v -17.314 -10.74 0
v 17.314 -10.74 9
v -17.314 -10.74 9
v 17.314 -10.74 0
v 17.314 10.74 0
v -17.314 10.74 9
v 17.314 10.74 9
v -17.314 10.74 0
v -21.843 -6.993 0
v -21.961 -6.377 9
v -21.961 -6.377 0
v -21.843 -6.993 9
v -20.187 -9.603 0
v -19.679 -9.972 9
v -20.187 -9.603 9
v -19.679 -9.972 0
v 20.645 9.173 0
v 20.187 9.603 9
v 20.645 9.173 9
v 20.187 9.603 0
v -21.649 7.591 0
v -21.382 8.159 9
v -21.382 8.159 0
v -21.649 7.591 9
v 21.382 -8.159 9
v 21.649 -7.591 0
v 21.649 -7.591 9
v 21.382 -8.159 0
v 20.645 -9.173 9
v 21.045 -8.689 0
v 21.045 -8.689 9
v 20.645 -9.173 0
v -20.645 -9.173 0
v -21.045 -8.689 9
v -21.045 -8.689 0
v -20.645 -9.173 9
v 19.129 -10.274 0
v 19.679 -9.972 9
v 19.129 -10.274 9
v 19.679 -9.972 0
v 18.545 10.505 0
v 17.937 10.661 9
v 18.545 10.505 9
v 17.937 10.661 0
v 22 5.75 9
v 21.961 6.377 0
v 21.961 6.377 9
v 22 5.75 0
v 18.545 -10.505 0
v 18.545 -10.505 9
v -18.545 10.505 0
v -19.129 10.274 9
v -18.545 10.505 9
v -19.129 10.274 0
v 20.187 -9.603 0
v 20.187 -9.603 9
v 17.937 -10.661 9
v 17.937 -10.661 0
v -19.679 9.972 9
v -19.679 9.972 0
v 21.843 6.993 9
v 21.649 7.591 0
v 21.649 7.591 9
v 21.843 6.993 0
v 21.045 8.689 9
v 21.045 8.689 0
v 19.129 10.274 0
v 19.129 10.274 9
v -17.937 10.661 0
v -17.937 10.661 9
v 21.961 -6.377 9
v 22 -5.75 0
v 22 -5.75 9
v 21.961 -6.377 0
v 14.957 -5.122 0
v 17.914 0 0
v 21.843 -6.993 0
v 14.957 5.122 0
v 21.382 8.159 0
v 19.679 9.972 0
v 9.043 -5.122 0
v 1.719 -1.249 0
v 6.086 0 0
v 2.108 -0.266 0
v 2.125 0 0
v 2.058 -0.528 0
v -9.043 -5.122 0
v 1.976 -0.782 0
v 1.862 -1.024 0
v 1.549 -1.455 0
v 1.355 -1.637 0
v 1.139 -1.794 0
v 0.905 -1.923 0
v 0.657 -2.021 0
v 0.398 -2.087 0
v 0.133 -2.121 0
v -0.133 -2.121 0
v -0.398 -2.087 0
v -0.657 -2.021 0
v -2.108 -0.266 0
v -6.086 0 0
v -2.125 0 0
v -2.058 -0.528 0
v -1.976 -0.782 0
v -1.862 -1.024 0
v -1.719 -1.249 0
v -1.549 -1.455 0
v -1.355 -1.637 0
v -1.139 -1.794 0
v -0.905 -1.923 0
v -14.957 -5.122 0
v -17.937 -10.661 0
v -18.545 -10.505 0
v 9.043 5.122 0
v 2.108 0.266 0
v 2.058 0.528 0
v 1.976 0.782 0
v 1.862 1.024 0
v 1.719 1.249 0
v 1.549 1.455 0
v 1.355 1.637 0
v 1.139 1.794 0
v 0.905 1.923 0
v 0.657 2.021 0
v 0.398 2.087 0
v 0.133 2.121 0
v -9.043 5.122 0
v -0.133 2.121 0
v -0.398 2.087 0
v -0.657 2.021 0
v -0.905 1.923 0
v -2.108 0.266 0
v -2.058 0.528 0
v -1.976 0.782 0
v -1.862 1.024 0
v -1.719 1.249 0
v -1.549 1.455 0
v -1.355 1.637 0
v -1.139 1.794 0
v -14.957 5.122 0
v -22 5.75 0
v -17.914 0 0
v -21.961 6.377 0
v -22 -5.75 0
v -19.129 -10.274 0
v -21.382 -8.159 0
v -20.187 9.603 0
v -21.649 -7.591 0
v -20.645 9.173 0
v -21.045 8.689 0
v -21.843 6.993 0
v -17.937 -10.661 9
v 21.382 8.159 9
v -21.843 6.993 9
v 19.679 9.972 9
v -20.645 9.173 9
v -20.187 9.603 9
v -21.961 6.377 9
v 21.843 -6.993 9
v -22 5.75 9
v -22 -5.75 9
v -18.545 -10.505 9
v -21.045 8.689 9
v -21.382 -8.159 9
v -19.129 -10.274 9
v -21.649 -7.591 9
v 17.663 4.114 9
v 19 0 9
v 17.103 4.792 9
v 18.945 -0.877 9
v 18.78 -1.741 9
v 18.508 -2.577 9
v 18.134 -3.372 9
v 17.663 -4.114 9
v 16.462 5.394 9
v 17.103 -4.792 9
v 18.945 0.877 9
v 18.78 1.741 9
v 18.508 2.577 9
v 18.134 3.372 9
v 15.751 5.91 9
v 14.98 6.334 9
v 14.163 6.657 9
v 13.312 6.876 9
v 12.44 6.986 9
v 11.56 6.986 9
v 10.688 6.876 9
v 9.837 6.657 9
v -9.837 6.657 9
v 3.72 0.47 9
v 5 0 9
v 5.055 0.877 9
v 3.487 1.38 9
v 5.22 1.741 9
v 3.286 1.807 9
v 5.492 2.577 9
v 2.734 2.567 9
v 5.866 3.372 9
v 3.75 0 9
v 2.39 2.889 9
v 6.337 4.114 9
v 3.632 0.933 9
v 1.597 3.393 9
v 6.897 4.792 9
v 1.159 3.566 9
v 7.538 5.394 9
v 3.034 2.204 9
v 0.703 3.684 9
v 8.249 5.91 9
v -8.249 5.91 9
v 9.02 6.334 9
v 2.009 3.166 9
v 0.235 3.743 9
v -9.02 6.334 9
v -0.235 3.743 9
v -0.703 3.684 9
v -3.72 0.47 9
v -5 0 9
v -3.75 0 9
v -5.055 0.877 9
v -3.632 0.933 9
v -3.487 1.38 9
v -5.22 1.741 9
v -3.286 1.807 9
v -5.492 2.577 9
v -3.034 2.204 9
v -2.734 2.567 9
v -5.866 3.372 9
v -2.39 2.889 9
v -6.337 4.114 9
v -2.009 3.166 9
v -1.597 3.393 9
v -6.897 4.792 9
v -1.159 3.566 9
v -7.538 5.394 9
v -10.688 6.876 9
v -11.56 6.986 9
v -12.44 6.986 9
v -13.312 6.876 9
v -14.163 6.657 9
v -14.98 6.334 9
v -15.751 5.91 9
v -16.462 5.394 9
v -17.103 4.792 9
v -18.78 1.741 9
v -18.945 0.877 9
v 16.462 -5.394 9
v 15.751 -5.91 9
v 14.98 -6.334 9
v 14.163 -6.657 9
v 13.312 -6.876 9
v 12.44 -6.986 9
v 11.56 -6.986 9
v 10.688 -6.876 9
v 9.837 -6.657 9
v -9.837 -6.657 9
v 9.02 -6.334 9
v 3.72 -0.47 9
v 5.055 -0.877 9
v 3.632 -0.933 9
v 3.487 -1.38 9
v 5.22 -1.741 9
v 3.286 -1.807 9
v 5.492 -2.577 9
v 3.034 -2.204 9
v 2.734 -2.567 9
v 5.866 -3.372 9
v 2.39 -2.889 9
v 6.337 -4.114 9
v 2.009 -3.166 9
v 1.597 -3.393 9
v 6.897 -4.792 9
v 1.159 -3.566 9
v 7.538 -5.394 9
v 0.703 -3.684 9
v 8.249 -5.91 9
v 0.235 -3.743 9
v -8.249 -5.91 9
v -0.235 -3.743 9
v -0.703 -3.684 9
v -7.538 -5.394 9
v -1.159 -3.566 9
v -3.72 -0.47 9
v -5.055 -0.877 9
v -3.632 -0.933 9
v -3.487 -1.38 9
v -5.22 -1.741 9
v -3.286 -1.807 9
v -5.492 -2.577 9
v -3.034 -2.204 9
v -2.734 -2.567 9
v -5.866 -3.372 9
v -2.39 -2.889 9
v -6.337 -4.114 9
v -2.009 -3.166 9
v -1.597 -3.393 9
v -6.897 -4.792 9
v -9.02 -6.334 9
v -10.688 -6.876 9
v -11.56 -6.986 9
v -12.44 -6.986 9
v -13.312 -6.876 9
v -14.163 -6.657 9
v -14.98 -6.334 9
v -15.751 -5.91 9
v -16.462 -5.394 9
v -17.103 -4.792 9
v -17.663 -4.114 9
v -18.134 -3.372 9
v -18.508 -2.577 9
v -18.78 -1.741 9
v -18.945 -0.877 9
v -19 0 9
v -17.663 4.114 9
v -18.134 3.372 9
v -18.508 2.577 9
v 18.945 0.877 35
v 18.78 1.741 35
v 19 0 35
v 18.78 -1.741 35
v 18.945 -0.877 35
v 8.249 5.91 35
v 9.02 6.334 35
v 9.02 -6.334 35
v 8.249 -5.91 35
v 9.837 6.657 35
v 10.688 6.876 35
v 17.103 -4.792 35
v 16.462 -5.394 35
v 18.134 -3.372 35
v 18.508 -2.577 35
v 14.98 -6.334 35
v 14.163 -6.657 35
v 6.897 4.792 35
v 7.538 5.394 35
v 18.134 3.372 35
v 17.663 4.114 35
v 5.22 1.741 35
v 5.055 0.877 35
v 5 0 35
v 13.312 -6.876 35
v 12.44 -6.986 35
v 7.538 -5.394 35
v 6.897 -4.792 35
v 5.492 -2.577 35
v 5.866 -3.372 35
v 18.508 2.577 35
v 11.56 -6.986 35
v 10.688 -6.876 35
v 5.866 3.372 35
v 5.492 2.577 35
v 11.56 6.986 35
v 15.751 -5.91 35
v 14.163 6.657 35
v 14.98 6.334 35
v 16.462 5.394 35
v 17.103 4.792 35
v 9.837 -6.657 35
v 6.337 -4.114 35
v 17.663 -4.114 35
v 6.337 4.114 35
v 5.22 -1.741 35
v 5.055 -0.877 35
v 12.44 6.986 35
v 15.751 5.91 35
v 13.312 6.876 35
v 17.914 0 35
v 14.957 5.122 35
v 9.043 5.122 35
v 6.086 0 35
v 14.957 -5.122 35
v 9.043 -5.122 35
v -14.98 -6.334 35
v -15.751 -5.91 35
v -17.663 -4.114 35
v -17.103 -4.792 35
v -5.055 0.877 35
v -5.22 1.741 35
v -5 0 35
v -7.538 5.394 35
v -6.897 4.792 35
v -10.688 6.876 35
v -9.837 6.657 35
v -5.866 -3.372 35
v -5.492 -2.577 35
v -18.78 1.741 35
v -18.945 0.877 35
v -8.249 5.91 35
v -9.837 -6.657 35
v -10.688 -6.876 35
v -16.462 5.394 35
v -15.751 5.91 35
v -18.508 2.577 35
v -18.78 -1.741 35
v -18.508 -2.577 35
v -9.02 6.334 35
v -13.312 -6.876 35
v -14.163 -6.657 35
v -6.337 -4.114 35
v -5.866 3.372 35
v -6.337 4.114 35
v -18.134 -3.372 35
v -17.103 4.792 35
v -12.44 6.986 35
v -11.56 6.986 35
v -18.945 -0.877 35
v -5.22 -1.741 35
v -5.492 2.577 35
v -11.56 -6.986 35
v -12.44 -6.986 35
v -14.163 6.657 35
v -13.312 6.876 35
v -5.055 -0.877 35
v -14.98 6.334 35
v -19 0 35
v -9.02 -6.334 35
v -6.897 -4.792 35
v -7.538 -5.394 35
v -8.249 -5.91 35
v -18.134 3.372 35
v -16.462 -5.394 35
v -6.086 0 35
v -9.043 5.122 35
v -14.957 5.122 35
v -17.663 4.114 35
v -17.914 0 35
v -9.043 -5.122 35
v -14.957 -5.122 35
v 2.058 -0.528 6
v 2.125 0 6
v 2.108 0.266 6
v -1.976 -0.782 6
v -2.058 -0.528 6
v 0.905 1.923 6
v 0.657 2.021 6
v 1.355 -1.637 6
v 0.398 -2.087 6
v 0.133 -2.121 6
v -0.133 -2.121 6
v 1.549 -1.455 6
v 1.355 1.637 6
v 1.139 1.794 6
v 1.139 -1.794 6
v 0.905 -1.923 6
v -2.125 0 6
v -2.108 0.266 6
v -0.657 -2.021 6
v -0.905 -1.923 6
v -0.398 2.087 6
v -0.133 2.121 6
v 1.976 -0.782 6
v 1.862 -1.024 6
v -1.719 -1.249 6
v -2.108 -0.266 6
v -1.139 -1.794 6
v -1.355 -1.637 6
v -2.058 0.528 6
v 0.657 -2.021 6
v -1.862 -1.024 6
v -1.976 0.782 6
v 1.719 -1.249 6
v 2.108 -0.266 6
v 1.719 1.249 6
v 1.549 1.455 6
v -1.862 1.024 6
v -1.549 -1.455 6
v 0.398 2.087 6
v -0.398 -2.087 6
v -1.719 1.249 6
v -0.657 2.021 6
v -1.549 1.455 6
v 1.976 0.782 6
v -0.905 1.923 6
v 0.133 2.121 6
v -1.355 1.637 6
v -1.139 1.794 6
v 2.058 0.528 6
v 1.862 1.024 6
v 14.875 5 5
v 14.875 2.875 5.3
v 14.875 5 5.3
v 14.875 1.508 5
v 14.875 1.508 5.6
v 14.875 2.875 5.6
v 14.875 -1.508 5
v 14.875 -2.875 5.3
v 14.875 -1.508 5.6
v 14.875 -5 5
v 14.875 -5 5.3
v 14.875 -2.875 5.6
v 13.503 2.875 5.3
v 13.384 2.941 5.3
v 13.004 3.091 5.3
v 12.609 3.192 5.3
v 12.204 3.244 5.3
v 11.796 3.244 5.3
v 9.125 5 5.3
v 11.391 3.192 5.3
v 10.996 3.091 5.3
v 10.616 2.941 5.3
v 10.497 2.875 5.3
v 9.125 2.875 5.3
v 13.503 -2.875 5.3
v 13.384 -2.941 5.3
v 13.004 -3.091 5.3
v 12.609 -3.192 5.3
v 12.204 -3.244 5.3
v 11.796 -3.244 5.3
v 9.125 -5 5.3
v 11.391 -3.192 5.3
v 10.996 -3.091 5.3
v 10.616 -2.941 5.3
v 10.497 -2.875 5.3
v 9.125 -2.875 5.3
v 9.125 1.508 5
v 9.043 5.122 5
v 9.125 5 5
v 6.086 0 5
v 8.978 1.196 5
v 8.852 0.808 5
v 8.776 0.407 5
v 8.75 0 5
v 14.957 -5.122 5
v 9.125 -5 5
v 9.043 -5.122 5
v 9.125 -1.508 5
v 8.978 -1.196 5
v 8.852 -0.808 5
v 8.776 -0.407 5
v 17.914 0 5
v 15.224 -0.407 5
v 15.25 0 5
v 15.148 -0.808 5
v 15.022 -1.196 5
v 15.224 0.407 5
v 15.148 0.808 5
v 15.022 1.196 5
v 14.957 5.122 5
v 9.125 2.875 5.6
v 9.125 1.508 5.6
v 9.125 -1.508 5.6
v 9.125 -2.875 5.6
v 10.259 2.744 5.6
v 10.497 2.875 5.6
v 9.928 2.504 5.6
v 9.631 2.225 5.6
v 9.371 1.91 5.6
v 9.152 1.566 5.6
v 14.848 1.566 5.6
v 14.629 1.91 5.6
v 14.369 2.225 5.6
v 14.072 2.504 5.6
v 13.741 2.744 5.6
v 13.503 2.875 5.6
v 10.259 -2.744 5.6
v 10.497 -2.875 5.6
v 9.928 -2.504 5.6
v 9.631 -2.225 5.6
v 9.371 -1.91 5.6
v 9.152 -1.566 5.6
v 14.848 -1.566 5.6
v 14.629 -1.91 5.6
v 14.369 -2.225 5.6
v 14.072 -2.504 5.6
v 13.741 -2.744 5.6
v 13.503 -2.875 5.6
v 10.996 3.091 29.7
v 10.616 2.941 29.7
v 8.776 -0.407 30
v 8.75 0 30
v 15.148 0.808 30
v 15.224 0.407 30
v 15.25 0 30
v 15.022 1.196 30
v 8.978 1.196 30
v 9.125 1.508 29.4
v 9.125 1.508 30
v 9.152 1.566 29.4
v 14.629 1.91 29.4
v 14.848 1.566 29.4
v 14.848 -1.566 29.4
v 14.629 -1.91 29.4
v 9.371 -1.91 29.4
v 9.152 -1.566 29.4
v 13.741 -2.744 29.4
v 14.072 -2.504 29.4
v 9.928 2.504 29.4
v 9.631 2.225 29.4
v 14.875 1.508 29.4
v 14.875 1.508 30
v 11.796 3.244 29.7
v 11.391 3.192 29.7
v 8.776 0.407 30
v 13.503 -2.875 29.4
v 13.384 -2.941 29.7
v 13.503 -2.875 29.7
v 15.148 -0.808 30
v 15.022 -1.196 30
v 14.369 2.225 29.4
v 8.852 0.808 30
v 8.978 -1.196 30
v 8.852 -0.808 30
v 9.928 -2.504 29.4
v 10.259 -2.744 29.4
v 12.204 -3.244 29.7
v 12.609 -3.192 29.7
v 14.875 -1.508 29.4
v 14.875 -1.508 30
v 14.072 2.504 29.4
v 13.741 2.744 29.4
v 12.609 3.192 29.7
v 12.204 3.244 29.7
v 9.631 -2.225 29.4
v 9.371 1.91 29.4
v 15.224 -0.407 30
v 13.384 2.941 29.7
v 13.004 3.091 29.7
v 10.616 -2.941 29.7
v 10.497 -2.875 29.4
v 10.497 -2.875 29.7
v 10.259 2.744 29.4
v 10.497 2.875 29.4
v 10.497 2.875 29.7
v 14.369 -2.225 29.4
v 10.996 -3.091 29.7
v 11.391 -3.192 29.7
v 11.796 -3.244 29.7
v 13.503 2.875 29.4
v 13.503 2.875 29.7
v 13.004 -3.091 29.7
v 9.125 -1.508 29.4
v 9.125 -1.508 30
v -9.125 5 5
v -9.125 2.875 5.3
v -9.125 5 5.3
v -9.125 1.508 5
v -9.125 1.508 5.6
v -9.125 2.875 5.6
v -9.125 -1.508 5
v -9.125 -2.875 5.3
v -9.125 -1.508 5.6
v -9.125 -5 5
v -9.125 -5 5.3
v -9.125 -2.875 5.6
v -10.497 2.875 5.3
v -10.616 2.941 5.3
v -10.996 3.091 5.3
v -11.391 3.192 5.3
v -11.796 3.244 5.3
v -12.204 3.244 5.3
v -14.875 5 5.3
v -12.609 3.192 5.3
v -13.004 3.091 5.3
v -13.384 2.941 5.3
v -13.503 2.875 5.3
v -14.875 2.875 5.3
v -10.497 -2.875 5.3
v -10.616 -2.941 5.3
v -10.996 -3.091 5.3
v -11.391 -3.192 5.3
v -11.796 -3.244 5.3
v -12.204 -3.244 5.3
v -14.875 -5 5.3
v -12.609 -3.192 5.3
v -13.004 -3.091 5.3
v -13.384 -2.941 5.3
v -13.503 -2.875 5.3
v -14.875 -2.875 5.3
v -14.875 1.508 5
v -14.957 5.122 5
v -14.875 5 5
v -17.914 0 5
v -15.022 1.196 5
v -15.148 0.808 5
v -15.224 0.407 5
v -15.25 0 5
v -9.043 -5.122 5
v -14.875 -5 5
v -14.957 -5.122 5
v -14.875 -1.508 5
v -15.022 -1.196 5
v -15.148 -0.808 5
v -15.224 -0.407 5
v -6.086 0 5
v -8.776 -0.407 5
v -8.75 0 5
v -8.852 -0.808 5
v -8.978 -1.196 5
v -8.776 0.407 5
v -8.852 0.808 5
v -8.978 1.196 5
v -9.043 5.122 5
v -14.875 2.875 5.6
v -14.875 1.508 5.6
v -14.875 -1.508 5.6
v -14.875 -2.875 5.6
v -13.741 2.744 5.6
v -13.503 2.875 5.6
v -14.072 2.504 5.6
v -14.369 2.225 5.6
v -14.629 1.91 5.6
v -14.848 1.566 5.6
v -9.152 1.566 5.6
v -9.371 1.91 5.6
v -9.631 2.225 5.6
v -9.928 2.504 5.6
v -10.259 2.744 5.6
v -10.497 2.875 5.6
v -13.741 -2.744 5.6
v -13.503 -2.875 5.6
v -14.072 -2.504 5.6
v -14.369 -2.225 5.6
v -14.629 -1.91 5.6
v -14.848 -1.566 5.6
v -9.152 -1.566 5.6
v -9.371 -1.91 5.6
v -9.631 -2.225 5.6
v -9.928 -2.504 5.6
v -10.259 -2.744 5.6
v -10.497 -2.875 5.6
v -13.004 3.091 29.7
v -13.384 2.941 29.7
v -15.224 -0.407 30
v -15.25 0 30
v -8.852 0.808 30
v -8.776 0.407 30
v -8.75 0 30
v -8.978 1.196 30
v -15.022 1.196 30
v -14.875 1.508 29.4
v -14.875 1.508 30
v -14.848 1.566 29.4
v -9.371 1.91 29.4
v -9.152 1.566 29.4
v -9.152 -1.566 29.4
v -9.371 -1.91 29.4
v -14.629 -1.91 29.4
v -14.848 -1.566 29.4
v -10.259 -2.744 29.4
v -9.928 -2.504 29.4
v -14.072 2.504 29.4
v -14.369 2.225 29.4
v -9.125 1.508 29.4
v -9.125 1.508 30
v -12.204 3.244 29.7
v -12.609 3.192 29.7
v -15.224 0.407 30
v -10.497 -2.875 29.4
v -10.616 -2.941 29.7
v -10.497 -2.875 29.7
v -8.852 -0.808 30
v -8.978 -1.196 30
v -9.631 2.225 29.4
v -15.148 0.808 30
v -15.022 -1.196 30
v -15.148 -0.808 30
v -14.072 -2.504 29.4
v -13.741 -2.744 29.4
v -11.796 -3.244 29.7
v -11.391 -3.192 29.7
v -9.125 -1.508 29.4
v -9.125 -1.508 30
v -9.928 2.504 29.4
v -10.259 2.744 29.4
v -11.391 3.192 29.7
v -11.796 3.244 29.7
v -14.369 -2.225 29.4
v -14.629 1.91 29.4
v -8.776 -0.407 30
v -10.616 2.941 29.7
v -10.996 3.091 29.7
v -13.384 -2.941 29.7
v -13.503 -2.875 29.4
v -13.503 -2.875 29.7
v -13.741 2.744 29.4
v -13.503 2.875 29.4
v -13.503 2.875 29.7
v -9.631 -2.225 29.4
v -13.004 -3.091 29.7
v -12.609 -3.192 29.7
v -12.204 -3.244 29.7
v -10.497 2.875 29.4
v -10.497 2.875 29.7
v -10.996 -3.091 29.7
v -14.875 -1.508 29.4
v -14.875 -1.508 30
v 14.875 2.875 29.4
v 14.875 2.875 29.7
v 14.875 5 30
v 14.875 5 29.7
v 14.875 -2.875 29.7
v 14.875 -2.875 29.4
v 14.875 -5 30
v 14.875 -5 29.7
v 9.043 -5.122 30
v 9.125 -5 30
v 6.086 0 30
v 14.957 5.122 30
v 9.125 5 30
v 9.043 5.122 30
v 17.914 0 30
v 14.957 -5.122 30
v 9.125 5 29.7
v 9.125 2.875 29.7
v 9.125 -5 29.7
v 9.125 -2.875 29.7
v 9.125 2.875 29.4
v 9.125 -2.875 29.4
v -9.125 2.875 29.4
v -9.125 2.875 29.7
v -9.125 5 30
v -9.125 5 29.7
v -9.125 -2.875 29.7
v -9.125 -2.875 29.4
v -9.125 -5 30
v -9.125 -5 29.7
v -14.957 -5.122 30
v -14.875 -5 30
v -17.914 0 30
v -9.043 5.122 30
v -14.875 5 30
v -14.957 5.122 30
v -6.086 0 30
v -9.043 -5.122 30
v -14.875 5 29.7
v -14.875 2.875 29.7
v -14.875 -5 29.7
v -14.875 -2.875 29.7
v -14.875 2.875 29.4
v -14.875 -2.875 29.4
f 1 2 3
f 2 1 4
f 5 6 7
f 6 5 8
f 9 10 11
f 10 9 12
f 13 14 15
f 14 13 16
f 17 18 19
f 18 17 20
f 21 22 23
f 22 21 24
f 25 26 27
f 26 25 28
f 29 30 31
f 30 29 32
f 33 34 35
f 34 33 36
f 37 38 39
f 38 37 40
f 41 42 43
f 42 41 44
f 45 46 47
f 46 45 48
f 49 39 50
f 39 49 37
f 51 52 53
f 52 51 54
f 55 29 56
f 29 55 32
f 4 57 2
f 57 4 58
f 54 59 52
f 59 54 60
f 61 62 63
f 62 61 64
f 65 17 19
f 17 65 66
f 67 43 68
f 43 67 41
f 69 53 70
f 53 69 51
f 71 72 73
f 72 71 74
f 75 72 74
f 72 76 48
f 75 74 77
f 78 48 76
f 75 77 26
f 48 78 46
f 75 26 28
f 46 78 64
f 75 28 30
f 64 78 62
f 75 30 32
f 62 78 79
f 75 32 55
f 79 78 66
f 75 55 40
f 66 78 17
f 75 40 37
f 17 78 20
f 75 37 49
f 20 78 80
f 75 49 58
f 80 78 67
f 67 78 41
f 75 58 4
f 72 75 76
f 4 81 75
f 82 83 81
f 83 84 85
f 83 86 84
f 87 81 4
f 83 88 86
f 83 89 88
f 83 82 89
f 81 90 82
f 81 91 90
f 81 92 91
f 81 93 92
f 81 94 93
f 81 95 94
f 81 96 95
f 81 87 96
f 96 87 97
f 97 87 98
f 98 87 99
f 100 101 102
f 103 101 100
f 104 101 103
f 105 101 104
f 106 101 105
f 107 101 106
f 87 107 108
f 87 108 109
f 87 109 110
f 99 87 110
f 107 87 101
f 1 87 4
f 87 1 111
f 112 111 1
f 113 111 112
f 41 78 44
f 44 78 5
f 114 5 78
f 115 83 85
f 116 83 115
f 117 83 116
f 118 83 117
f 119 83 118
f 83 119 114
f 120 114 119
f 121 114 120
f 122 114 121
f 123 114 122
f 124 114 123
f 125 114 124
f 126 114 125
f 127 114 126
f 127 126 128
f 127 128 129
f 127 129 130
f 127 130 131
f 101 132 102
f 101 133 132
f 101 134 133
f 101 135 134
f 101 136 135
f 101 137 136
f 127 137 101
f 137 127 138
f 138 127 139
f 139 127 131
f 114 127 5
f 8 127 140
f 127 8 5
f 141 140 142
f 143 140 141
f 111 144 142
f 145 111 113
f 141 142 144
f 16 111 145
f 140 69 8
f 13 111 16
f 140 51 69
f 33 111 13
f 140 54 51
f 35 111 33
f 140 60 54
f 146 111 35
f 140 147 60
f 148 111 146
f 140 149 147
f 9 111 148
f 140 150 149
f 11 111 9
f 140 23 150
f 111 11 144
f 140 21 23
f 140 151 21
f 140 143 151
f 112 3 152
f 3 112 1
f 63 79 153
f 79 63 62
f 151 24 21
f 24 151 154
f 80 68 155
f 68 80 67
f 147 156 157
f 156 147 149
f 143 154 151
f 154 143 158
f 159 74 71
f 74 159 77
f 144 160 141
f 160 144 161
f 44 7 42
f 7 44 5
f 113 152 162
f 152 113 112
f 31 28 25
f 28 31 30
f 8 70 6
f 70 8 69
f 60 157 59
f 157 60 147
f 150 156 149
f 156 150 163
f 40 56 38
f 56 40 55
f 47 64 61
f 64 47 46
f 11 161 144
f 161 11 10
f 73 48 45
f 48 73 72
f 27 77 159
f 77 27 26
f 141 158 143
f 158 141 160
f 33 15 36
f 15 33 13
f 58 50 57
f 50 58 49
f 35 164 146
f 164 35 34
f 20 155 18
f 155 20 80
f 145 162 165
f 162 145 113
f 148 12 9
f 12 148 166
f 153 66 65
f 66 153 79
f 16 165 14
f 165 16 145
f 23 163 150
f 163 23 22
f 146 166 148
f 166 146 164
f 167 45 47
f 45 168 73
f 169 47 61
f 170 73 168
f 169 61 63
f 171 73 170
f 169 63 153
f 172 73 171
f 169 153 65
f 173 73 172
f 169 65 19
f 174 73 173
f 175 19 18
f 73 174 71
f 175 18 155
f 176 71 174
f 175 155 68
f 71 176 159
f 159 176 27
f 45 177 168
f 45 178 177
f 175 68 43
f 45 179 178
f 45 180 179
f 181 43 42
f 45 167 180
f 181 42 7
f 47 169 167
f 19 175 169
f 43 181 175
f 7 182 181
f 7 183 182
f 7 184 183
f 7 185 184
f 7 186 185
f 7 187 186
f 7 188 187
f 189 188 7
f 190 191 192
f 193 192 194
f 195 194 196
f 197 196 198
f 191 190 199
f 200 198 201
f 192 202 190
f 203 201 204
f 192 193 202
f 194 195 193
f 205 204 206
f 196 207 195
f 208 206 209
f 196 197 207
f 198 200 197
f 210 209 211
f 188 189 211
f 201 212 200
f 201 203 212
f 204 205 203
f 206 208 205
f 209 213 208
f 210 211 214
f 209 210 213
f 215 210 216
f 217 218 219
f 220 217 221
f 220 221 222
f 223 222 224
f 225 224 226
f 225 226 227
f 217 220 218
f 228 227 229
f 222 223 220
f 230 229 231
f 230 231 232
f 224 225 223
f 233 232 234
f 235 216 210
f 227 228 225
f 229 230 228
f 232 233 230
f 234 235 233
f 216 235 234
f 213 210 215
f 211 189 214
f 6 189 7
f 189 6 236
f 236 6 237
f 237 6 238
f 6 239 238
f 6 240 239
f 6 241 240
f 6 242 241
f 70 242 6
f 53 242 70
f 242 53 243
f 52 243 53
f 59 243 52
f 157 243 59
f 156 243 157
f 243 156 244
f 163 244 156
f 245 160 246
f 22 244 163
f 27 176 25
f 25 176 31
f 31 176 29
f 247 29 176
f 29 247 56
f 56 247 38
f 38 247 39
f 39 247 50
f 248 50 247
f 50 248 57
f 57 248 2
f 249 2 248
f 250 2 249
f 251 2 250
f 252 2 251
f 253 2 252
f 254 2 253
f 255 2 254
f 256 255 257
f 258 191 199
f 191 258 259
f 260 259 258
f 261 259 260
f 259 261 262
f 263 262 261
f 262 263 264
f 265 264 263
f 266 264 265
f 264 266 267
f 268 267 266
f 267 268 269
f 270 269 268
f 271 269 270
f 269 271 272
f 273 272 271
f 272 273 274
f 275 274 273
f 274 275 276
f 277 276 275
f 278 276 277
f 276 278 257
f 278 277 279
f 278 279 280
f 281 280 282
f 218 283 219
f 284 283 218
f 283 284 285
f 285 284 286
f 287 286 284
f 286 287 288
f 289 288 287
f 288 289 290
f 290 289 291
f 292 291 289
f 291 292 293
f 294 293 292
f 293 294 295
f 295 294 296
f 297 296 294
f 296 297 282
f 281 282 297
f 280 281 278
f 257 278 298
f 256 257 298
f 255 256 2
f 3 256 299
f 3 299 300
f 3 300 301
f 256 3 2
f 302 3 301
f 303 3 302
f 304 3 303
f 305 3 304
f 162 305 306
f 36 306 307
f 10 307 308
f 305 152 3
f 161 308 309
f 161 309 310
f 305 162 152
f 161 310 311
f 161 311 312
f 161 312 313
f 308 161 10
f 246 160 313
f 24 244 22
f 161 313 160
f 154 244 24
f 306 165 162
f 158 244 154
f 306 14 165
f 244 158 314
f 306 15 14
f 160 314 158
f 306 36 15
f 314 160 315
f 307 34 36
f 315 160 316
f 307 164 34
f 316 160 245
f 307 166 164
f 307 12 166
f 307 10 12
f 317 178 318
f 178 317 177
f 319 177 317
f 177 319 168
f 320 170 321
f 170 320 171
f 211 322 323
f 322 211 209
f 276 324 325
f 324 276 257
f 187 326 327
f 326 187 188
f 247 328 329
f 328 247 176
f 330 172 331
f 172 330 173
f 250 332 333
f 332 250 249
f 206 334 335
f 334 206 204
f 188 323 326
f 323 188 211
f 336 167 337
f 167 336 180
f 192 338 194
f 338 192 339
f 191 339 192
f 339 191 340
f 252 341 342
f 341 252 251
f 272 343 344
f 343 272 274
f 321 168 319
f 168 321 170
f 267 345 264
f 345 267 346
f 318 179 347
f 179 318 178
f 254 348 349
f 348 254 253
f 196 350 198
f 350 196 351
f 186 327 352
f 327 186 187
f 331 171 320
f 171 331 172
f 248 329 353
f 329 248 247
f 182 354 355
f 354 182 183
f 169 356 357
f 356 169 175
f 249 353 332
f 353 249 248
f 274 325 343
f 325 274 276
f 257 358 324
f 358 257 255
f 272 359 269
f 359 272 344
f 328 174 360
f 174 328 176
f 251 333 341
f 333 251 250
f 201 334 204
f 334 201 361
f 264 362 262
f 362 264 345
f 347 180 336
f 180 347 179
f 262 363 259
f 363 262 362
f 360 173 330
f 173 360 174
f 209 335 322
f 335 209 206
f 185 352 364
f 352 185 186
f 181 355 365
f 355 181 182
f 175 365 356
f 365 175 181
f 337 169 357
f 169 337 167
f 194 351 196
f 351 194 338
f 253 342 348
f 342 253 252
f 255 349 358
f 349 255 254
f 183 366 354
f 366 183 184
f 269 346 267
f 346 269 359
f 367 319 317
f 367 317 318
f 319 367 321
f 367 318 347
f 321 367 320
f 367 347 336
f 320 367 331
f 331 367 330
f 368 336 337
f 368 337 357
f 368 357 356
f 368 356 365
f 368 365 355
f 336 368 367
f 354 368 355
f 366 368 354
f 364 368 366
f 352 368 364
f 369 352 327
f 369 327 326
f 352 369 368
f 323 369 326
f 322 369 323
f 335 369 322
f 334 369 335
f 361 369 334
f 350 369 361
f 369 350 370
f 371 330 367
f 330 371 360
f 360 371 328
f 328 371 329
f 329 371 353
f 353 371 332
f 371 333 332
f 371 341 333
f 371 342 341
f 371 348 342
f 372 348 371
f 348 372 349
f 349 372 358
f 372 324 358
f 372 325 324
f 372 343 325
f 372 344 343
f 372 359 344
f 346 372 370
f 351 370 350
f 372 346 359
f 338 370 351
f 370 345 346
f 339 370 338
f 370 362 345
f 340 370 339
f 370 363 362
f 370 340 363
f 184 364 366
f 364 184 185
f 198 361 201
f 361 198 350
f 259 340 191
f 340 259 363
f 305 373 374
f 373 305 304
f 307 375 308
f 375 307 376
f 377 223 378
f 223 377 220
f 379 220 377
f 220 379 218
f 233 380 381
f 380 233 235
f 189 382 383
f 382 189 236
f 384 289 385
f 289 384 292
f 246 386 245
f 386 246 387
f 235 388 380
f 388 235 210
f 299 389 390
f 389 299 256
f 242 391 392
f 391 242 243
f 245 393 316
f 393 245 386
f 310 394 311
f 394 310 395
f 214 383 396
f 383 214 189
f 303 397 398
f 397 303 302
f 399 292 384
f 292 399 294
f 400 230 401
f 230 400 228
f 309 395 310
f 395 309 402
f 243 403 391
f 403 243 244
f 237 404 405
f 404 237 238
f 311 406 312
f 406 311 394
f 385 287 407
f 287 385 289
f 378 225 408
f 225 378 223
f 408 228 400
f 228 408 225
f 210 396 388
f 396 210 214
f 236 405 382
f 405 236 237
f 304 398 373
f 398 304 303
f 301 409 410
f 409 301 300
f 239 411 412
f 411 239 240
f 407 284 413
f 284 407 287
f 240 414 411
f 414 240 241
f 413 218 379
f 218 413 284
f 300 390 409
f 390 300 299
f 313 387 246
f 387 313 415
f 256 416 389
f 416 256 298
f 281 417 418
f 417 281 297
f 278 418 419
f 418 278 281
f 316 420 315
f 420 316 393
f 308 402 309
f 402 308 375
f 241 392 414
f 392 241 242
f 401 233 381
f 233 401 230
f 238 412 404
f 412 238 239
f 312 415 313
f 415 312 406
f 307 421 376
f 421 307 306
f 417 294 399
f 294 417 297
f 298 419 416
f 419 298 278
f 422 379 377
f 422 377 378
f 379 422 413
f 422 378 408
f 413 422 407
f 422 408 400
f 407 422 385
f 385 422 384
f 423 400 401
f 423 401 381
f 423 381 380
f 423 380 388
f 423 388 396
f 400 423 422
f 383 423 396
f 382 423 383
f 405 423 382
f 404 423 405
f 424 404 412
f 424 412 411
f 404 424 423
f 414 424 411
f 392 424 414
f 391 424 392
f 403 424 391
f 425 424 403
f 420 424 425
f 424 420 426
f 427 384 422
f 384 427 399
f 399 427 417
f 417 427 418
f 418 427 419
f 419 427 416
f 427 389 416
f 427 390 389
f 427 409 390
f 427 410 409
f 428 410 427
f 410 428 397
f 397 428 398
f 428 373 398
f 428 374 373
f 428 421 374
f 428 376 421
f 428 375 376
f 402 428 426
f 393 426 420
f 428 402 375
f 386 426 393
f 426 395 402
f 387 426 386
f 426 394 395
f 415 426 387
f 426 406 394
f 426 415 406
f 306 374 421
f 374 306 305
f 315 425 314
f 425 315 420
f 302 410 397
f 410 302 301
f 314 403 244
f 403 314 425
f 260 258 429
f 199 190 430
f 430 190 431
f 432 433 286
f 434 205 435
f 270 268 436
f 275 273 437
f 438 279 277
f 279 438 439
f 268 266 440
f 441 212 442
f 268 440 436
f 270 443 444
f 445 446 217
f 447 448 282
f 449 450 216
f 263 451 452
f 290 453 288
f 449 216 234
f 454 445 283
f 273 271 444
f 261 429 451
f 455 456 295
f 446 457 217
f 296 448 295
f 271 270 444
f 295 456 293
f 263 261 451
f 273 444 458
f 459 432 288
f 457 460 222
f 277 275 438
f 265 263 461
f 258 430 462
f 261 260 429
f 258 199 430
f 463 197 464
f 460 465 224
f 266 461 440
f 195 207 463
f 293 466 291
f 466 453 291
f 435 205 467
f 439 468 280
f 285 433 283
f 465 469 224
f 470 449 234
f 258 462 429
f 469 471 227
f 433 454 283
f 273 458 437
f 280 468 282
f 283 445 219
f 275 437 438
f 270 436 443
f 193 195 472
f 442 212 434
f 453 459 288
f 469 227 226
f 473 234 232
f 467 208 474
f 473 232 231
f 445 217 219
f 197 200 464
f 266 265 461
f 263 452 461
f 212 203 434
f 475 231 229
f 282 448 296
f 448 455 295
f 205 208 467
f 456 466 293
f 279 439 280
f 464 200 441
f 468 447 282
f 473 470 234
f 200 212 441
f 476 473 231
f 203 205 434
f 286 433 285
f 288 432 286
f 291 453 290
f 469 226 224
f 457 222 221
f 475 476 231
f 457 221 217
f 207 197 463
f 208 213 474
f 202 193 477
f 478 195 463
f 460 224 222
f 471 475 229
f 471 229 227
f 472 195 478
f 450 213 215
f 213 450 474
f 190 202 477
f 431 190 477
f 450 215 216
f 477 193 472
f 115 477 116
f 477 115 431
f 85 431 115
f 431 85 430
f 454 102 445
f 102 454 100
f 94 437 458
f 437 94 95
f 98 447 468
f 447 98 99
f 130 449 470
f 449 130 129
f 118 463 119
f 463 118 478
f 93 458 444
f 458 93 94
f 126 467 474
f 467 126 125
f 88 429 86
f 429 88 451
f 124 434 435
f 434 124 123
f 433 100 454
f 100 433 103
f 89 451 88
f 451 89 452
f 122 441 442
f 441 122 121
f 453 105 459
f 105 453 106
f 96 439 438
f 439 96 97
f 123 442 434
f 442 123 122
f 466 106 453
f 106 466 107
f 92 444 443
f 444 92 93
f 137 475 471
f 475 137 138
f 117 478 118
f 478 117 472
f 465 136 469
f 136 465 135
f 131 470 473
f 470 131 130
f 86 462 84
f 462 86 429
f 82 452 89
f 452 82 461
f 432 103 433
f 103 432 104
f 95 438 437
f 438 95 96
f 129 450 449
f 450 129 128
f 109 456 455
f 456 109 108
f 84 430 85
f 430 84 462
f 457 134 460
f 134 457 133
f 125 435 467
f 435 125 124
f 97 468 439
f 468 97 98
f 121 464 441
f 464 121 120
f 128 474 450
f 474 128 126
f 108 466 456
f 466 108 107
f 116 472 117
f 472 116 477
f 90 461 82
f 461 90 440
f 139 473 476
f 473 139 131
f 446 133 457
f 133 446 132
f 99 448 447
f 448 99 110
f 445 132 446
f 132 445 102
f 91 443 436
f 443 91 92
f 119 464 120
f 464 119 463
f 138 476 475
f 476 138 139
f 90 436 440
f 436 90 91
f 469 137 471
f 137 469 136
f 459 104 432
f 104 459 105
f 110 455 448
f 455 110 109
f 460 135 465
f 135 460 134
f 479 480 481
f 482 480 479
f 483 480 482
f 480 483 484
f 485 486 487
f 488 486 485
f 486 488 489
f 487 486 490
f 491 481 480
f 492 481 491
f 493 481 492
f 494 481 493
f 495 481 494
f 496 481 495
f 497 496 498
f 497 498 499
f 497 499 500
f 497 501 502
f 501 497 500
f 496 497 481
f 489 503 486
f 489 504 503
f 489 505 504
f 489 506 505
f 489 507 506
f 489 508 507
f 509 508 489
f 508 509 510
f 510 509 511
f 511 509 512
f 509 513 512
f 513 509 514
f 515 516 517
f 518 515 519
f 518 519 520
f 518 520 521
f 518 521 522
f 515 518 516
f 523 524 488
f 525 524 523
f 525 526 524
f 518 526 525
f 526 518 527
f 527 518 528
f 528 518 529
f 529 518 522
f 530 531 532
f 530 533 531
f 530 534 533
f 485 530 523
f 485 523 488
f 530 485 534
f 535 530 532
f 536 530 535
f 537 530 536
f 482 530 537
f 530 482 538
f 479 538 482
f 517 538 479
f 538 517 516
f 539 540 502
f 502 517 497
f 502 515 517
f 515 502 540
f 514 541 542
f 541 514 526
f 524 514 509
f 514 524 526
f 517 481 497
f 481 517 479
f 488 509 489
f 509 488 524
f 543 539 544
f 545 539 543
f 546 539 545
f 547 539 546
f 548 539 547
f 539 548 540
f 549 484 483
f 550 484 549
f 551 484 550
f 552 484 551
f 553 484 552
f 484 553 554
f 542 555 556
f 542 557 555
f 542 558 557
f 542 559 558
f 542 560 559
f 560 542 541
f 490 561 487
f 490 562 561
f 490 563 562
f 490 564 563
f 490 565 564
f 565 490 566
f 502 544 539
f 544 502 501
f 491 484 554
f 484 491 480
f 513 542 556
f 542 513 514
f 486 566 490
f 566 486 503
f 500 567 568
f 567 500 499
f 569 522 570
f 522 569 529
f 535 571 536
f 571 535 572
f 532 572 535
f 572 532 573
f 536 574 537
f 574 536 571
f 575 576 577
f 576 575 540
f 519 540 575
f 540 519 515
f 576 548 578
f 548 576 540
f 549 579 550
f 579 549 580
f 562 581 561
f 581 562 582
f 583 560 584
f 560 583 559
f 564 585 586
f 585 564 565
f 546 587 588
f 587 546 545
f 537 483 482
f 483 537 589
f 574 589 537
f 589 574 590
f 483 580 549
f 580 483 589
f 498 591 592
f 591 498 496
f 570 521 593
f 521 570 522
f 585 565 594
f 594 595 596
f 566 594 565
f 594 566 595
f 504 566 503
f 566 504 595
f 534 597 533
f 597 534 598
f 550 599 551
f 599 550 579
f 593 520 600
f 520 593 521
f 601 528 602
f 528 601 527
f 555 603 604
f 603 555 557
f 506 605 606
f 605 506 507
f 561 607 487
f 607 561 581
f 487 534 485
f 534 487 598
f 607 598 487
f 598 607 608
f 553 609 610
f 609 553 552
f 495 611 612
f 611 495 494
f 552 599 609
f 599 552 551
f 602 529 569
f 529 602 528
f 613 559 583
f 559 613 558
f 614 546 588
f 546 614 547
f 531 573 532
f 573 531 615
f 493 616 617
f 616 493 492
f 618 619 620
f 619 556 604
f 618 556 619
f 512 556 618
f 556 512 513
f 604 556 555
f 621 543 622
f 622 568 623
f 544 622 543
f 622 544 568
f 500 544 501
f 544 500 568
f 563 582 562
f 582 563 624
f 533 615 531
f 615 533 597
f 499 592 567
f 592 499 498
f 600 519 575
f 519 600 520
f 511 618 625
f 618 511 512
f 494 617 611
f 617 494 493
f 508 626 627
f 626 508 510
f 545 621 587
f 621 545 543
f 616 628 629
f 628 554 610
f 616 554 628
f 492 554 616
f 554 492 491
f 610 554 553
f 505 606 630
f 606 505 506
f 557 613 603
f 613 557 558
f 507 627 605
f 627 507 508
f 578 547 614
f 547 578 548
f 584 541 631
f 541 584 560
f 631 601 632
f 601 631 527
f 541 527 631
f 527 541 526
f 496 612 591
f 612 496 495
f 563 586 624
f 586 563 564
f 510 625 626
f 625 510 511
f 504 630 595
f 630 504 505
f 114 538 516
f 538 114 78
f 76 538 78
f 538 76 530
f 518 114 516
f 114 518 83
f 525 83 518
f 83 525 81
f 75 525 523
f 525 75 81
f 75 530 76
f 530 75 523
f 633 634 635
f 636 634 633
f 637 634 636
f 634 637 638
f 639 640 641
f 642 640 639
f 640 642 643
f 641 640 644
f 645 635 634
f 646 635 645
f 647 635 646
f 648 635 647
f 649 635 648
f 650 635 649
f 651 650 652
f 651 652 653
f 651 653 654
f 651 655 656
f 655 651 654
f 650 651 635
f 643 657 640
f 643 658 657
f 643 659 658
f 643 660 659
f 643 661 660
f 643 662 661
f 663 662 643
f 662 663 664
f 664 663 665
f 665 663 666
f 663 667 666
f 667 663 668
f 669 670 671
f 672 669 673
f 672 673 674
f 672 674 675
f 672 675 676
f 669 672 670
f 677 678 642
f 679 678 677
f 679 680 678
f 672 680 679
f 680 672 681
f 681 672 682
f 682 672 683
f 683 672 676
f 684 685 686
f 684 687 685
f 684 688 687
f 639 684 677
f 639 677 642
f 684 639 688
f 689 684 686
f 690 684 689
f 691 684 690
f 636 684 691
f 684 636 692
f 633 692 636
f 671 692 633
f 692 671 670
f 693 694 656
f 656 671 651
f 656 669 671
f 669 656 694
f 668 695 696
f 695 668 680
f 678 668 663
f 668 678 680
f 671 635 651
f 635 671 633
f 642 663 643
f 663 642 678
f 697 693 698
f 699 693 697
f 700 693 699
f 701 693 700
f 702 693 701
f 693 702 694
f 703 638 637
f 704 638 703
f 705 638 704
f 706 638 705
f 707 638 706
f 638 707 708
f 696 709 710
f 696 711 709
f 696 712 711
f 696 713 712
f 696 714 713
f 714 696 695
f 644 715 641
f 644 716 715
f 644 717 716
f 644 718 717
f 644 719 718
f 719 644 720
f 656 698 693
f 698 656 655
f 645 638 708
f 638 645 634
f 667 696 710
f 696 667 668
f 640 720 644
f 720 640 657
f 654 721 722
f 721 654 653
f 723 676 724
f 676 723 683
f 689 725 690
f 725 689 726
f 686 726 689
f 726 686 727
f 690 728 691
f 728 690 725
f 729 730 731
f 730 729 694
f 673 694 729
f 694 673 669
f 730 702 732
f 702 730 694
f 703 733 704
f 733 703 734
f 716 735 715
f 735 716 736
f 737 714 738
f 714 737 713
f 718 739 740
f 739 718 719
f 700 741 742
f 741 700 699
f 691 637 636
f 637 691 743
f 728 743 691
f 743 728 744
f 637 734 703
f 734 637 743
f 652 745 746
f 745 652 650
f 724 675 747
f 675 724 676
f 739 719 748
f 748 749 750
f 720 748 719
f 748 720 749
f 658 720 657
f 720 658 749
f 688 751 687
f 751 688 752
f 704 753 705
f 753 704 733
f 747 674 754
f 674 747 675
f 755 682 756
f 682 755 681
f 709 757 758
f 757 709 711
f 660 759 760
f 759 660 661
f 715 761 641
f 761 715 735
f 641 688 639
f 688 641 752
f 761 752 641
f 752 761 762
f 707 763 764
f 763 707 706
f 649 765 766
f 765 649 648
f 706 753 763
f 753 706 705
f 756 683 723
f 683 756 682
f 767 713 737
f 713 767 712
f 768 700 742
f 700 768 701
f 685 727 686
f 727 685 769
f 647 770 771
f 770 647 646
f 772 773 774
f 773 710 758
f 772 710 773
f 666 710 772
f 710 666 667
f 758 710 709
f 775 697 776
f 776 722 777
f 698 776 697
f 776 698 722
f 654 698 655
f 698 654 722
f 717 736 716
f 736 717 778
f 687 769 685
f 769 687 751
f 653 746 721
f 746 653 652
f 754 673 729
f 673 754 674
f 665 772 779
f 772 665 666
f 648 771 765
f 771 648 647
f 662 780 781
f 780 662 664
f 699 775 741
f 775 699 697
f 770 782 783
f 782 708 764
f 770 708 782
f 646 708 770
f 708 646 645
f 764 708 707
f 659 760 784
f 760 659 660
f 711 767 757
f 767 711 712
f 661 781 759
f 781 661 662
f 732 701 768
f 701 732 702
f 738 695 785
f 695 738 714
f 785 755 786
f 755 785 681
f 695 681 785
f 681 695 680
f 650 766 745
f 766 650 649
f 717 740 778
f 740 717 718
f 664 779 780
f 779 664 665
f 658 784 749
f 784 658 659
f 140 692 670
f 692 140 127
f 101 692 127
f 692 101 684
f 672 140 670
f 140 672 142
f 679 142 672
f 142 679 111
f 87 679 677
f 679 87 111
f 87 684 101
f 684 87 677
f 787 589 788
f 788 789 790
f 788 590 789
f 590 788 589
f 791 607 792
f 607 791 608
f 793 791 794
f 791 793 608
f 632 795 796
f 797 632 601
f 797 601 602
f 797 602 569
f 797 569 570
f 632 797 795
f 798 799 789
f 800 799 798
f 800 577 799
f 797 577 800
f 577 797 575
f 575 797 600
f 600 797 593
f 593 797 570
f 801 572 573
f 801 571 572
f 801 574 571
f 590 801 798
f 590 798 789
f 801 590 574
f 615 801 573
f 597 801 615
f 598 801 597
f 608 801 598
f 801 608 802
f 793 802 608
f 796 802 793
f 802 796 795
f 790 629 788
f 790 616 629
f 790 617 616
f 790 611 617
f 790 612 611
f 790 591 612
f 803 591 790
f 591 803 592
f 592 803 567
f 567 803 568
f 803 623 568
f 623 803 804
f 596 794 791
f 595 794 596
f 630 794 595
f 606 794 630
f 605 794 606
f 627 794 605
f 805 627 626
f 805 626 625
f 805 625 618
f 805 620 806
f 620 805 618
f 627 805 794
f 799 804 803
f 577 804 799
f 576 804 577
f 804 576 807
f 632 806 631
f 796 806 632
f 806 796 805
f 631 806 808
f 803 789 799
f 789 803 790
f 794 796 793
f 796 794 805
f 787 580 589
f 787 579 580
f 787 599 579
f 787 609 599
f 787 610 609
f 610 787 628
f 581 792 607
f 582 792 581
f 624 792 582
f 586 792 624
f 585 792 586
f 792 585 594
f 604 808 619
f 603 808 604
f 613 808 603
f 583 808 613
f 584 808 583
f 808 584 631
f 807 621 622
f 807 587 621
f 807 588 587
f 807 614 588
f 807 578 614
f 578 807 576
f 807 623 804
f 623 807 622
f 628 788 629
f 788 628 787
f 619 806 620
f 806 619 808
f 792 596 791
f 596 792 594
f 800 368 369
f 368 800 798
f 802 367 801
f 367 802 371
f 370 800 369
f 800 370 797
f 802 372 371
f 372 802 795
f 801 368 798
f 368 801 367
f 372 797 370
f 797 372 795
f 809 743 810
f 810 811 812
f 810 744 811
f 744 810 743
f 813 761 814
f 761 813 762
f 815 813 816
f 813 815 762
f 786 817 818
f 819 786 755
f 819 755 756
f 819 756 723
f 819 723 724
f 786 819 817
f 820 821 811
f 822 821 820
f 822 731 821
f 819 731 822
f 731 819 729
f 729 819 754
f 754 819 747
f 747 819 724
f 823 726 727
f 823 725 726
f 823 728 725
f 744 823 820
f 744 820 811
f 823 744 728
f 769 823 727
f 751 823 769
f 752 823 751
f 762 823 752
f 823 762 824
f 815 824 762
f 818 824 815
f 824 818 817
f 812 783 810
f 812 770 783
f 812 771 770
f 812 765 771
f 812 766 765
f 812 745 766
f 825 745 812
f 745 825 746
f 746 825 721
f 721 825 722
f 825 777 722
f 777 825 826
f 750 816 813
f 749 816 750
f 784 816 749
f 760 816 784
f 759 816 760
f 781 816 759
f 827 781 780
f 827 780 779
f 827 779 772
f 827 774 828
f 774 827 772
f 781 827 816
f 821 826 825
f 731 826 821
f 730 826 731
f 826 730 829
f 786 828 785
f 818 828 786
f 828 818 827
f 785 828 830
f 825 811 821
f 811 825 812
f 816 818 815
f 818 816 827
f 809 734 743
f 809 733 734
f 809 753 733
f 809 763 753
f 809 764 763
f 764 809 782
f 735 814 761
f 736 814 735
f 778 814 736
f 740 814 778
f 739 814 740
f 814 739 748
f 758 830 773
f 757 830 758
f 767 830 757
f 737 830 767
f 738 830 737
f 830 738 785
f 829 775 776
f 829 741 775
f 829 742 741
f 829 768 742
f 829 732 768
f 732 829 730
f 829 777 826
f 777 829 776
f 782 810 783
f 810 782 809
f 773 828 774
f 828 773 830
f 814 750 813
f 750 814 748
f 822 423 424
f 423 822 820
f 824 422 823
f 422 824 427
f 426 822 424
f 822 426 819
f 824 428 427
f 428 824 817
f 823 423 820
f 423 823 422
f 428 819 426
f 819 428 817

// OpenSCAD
$fn = 50;


difference() {
	union() {
		hull() {
			translate(v = [-17.0000000000, 5.7500000000, 0]) {
				cylinder(h = 9, r = 5);
			}
			translate(v = [17.0000000000, 5.7500000000, 0]) {
				cylinder(h = 9, r = 5);
			}
			translate(v = [-17.0000000000, -5.7500000000, 0]) {
				cylinder(h = 9, r = 5);
			}
			translate(v = [17.0000000000, -5.7500000000, 0]) {
				cylinder(h = 9, r = 5);
			}
		}
		translate(v = [12.0000000000, 0, 0.0000000000]) {
			cylinder(h = 35, r = 7.0000000000);
		}
		translate(v = [-12.0000000000, 0, 0.0000000000]) {
			cylinder(h = 35, r = 7.0000000000);
		}
	}
	union() {
		translate(v = [0, 0, 9]) {
			rotate(a = [0, 0, 0]) {
				difference() {
					union() {
						#translate(v = [0, 0, -30.0000000000]) {
							cylinder(h = 30, r = 2.0000000000);
						}
						#translate(v = [0, 0, -3]) {
							cylinder(h = 3, r1 = 2.1250000000, r2 = 3.7500000000);
						}
						#translate(v = [0, 0, -30.0000000000]) {
							cylinder(h = 30, r = 2.1250000000);
						}
						#translate(v = [0, 0, -30.0000000000]) {
							cylinder(h = 30, r = 2.0000000000);
						}
					}
					union();
				}
			}
		}
		translate(v = [12.0000000000, 0, 0]) {
			rotate(a = [0, 0, 0]) {
				difference() {
					union() {
						#translate(v = [-2.8750000000, -5.0000000000, -0.3000000000]) {
							cube(size = [5.7500000000, 10, 0.3000000000]);
						}
						#translate(v = [-2.8750000000, -2.8750000000, -0.6000000000]) {
							cube(size = [5.7500000000, 5.7500000000, 0.3000000000]);
						}
						#translate(v = [-2.8750000000, -5.0000000000, 5]) {
							cube(size = [5.7500000000, 10, 0.3000000000]);
						}
						#translate(v = [-2.8750000000, -2.8750000000, 5.3000000000]) {
							cube(size = [5.7500000000, 5.7500000000, 0.3000000000]);
						}
						#translate(v = [0, 0, -100.0000000000]) {
							cylinder(h = 200, r = 3.2500000000);
						}
						#linear_extrude(height = 5) {
							polygon(points = [[5.9142500000, 0.0000000000], [2.9571250000, 5.1218907443], [-2.9571250000, 5.1218907443], [-5.9142500000, 0.0000000000], [-2.9571250000, -5.1218907443], [2.9571250000, -5.1218907443]]);
						}
						#translate(v = [-2.8750000000, -5.0000000000, -0.3000000000]) {
							cube(size = [5.7500000000, 10, 0.3000000000]);
						}
						#translate(v = [-2.8750000000, -2.8750000000, -0.6000000000]) {
							cube(size = [5.7500000000, 5.7500000000, 0.3000000000]);
						}
						#translate(v = [-2.8750000000, -5.0000000000, 5]) {
							cube(size = [5.7500000000, 10, 0.3000000000]);
						}
						#translate(v = [-2.8750000000, -2.8750000000, 5.3000000000]) {
							cube(size = [5.7500000000, 5.7500000000, 0.3000000000]);
						}
						#translate(v = [0, 0, -100.0000000000]) {
							cylinder(h = 200, r = 3.2500000000);
						}
						#translate(v = [-2.8750000000, -5.0000000000, -0.3000000000]) {
							cube(size = [5.7500000000, 10, 0.3000000000]);
						}
						#translate(v = [-2.8750000000, -2.8750000000, -0.6000000000]) {
							cube(size = [5.7500000000, 5.7500000000, 0.3000000000]);
						}
						#translate(v = [-2.8750000000, -5.0000000000, 5]) {
							cube(size = [5.7500000000, 10, 0.3000000000]);
						}
						#translate(v = [-2.8750000000, -2.8750000000, 5.3000000000]) {
							cube(size = [5.7500000000, 5.7500000000, 0.3000000000]);
						}
						#translate(v = [0, 0, -100.0000000000]) {
							cylinder(h = 200, r = 3.2500000000);
						}
					}
					union();
				}
			}
		}
		translate(v = [-12.0000000000, 0, 0]) {
			rotate(a = [0, 0, 0]) {
				difference() {
					union() {
						#translate(v = [-2.8750000000, -5.0000000000, -0.3000000000]) {
							cube(size = [5.7500000000, 10, 0.3000000000]);
						}
						#translate(v = [-2.8750000000, -2.8750000000, -0.6000000000]) {
							cube(size = [5.7500000000, 5.7500000000, 0.3000000000]);
						}
						#translate(v = [-2.8750000000, -5.0000000000, 5]) {
							cube(size = [5.7500000000, 10, 0.3000000000]);
						}
						#translate(v = [-2.8750000000, -2.8750000000, 5.3000000000]) {
							cube(size = [5.7500000000, 5.7500000000, 0.3000000000]);
						}
						#translate(v = [0, 0, -100.0000000000]) {
							cylinder(h = 200, r = 3.2500000000);
						}
						#linear_extrude(height = 5) {
							polygon(points = [[5.9142500000, 0.0000000000], [2.9571250000, 5.1218907443], [-2.9571250000, 5.1218907443], [-5.9142500000, 0.0000000000], [-2.9571250000, -5.1218907443], [2.9571250000, -5.1218907443]]);
						}
						#translate(v = [-2.8750000000, -5.0000000000, -0.3000000000]) {
							cube(size = [5.7500000000, 10, 0.3000000000]);
						}
						#translate(v = [-2.8750000000, -2.8750000000, -0.6000000000]) {
							cube(size = [5.7500000000, 5.7500000000, 0.3000000000]);
						}
						#translate(v = [-2.8750000000, -5.0000000000, 5]) {
							cube(size = [5.7500000000, 10, 0.3000000000]);
						}
						#translate(v = [-2.8750000000, -2.8750000000, 5.3000000000]) {
							cube(size = [5.7500000000, 5.7500000000, 0.3000000000]);
						}
						#translate(v = [0, 0, -100.0000000000]) {
							cylinder(h = 200, r = 3.2500000000);
						}
						#translate(v = [-2.8750000000, -5.0000000000, -0.3000000000]) {
							cube(size = [5.7500000000, 10, 0.3000000000]);
						}
						#translate(v = [-2.8750000000, -2.8750000000, -0.6000000000]) {
							cube(size = [5.7500000000, 5.7500000000, 0.3000000000]);
						}
						#translate(v = [-2.8750000000, -5.0000000000, 5]) {
							cube(size = [5.7500000000, 10, 0.3000000000]);
						}
						#translate(v = [-2.8750000000, -2.8750000000, 5.3000000000]) {
							cube(size = [5.7500000000, 5.7500000000, 0.3000000000]);
						}
						#translate(v = [0, 0, -100.0000000000]) {
							cylinder(h = 200, r = 3.2500000000);
						}
					}
					union();
				}
			}
		}
		translate(v = [12.0000000000, 0, 35]) {
			rotate(a = [0, 0, 0]) {
				difference() {
					union() {
						#translate(v = [-2.8750000000, -5.0000000000, -5.3000000000]) {
							cube(size = [5.7500000000, 10, 0.3000000000]);
						}
						#translate(v = [-2.8750000000, -2.8750000000, -5.6000000000]) {
							cube(size = [5.7500000000, 5.7500000000, 0.3000000000]);
						}
						#translate(v = [-2.8750000000, -5.0000000000, 0]) {
							cube(size = [5.7500000000, 10, 0.3000000000]);
						}
						#translate(v = [-2.8750000000, -2.8750000000, 0.3000000000]) {
							cube(size = [5.7500000000, 5.7500000000, 0.3000000000]);
						}
						#translate(v = [0, 0, -100.0000000000]) {
							cylinder(h = 200, r = 3.2500000000);
						}
						translate(v = [0, 0, -5]) {
							#linear_extrude(height = 5) {
								polygon(points = [[5.9142500000, 0.0000000000], [2.9571250000, 5.1218907443], [-2.9571250000, 5.1218907443], [-5.9142500000, 0.0000000000], [-2.9571250000, -5.1218907443], [2.9571250000, -5.1218907443]]);
							}
						}
						#translate(v = [-2.8750000000, -5.0000000000, -5.3000000000]) {
							cube(size = [5.7500000000, 10, 0.3000000000]);
						}
						#translate(v = [-2.8750000000, -2.8750000000, -5.6000000000]) {
							cube(size = [5.7500000000, 5.7500000000, 0.3000000000]);
						}
						#translate(v = [-2.8750000000, -5.0000000000, 0]) {
							cube(size = [5.7500000000, 10, 0.3000000000]);
						}
						#translate(v = [-2.8750000000, -2.8750000000, 0.3000000000]) {
							cube(size = [5.7500000000, 5.7500000000, 0.3000000000]);
						}
						#translate(v = [0, 0, -100.0000000000]) {
							cylinder(h = 200, r = 3.2500000000);
						}
						#translate(v = [-2.8750000000, -5.0000000000, -5.3000000000]) {
							cube(size = [5.7500000000, 10, 0.3000000000]);
						}
						#translate(v = [-2.8750000000, -2.8750000000, -5.6000000000]) {
							cube(size = [5.7500000000, 5.7500000000, 0.3000000000]);
						}
						#translate(v = [-2.8750000000, -5.0000000000, 0]) {
							cube(size = [5.7500000000, 10, 0.3000000000]);
						}
						#translate(v = [-2.8750000000, -2.8750000000, 0.3000000000]) {
							cube(size = [5.7500000000, 5.7500000000, 0.3000000000]);
						}
						#translate(v = [0, 0, -100.0000000000]) {
							cylinder(h = 200, r = 3.2500000000);
						}
					}
					union();
				}
			}
		}
		translate(v = [-12.0000000000, 0, 35]) {
			rotate(a = [0, 0, 0]) {
				difference() {
					union() {
						#translate(v = [-2.8750000000, -5.0000000000, -5.3000000000]) {
							cube(size = [5.7500000000, 10, 0.3000000000]);
						}
						#translate(v = [-2.8750000000, -2.8750000000, -5.6000000000]) {
							cube(size = [5.7500000000, 5.7500000000, 0.3000000000]);
						}
						#translate(v = [-2.8750000000, -5.0000000000, 0]) {
							cube(size = [5.7500000000, 10, 0.3000000000]);
						}
						#translate(v = [-2.8750000000, -2.8750000000, 0.3000000000]) {
							cube(size = [5.7500000000, 5.7500000000, 0.3000000000]);
						}
						#translate(v = [0, 0, -100.0000000000]) {
							cylinder(h = 200, r = 3.2500000000);
						}
						translate(v = [0, 0, -5]) {
							#linear_extrude(height = 5) {
								polygon(points = [[5.9142500000, 0.0000000000], [2.9571250000, 5.1218907443], [-2.9571250000, 5.1218907443], [-5.9142500000, 0.0000000000], [-2.9571250000, -5.1218907443], [2.9571250000, -5.1218907443]]);
							}
						}
						#translate(v = [-2.8750000000, -5.0000000000, -5.3000000000]) {
							cube(size = [5.7500000000, 10, 0.3000000000]);
						}
						#translate(v = [-2.8750000000, -2.8750000000, -5.6000000000]) {
							cube(size = [5.7500000000, 5.7500000000, 0.3000000000]);
						}
						#translate(v = [-2.8750000000, -5.0000000000, 0]) {
							cube(size = [5.7500000000, 10, 0.3000000000]);
						}
						#translate(v = [-2.8750000000, -2.8750000000, 0.3000000000]) {
							cube(size = [5.7500000000, 5.7500000000, 0.3000000000]);
						}
						#translate(v = [0, 0, -100.0000000000]) {
							cylinder(h = 200, r = 3.2500000000);
						}
						#translate(v = [-2.8750000000, -5.0000000000, -5.3000000000]) {
							cube(size = [5.7500000000, 10, 0.3000000000]);
						}
						#translate(v = [-2.8750000000, -2.8750000000, -5.6000000000]) {
							cube(size = [5.7500000000, 5.7500000000, 0.3000000000]);
						}
						#translate(v = [-2.8750000000, -5.0000000000, 0]) {
							cube(size = [5.7500000000, 10, 0.3000000000]);
						}
						#translate(v = [-2.8750000000, -2.8750000000, 0.3000000000]) {
							cube(size = [5.7500000000, 5.7500000000, 0.3000000000]);
						}
						#translate(v = [0, 0, -100.0000000000]) {
							cylinder(h = 200, r = 3.2500000000);
						}
					}
					union();
				}
			}
		}
	}
}
